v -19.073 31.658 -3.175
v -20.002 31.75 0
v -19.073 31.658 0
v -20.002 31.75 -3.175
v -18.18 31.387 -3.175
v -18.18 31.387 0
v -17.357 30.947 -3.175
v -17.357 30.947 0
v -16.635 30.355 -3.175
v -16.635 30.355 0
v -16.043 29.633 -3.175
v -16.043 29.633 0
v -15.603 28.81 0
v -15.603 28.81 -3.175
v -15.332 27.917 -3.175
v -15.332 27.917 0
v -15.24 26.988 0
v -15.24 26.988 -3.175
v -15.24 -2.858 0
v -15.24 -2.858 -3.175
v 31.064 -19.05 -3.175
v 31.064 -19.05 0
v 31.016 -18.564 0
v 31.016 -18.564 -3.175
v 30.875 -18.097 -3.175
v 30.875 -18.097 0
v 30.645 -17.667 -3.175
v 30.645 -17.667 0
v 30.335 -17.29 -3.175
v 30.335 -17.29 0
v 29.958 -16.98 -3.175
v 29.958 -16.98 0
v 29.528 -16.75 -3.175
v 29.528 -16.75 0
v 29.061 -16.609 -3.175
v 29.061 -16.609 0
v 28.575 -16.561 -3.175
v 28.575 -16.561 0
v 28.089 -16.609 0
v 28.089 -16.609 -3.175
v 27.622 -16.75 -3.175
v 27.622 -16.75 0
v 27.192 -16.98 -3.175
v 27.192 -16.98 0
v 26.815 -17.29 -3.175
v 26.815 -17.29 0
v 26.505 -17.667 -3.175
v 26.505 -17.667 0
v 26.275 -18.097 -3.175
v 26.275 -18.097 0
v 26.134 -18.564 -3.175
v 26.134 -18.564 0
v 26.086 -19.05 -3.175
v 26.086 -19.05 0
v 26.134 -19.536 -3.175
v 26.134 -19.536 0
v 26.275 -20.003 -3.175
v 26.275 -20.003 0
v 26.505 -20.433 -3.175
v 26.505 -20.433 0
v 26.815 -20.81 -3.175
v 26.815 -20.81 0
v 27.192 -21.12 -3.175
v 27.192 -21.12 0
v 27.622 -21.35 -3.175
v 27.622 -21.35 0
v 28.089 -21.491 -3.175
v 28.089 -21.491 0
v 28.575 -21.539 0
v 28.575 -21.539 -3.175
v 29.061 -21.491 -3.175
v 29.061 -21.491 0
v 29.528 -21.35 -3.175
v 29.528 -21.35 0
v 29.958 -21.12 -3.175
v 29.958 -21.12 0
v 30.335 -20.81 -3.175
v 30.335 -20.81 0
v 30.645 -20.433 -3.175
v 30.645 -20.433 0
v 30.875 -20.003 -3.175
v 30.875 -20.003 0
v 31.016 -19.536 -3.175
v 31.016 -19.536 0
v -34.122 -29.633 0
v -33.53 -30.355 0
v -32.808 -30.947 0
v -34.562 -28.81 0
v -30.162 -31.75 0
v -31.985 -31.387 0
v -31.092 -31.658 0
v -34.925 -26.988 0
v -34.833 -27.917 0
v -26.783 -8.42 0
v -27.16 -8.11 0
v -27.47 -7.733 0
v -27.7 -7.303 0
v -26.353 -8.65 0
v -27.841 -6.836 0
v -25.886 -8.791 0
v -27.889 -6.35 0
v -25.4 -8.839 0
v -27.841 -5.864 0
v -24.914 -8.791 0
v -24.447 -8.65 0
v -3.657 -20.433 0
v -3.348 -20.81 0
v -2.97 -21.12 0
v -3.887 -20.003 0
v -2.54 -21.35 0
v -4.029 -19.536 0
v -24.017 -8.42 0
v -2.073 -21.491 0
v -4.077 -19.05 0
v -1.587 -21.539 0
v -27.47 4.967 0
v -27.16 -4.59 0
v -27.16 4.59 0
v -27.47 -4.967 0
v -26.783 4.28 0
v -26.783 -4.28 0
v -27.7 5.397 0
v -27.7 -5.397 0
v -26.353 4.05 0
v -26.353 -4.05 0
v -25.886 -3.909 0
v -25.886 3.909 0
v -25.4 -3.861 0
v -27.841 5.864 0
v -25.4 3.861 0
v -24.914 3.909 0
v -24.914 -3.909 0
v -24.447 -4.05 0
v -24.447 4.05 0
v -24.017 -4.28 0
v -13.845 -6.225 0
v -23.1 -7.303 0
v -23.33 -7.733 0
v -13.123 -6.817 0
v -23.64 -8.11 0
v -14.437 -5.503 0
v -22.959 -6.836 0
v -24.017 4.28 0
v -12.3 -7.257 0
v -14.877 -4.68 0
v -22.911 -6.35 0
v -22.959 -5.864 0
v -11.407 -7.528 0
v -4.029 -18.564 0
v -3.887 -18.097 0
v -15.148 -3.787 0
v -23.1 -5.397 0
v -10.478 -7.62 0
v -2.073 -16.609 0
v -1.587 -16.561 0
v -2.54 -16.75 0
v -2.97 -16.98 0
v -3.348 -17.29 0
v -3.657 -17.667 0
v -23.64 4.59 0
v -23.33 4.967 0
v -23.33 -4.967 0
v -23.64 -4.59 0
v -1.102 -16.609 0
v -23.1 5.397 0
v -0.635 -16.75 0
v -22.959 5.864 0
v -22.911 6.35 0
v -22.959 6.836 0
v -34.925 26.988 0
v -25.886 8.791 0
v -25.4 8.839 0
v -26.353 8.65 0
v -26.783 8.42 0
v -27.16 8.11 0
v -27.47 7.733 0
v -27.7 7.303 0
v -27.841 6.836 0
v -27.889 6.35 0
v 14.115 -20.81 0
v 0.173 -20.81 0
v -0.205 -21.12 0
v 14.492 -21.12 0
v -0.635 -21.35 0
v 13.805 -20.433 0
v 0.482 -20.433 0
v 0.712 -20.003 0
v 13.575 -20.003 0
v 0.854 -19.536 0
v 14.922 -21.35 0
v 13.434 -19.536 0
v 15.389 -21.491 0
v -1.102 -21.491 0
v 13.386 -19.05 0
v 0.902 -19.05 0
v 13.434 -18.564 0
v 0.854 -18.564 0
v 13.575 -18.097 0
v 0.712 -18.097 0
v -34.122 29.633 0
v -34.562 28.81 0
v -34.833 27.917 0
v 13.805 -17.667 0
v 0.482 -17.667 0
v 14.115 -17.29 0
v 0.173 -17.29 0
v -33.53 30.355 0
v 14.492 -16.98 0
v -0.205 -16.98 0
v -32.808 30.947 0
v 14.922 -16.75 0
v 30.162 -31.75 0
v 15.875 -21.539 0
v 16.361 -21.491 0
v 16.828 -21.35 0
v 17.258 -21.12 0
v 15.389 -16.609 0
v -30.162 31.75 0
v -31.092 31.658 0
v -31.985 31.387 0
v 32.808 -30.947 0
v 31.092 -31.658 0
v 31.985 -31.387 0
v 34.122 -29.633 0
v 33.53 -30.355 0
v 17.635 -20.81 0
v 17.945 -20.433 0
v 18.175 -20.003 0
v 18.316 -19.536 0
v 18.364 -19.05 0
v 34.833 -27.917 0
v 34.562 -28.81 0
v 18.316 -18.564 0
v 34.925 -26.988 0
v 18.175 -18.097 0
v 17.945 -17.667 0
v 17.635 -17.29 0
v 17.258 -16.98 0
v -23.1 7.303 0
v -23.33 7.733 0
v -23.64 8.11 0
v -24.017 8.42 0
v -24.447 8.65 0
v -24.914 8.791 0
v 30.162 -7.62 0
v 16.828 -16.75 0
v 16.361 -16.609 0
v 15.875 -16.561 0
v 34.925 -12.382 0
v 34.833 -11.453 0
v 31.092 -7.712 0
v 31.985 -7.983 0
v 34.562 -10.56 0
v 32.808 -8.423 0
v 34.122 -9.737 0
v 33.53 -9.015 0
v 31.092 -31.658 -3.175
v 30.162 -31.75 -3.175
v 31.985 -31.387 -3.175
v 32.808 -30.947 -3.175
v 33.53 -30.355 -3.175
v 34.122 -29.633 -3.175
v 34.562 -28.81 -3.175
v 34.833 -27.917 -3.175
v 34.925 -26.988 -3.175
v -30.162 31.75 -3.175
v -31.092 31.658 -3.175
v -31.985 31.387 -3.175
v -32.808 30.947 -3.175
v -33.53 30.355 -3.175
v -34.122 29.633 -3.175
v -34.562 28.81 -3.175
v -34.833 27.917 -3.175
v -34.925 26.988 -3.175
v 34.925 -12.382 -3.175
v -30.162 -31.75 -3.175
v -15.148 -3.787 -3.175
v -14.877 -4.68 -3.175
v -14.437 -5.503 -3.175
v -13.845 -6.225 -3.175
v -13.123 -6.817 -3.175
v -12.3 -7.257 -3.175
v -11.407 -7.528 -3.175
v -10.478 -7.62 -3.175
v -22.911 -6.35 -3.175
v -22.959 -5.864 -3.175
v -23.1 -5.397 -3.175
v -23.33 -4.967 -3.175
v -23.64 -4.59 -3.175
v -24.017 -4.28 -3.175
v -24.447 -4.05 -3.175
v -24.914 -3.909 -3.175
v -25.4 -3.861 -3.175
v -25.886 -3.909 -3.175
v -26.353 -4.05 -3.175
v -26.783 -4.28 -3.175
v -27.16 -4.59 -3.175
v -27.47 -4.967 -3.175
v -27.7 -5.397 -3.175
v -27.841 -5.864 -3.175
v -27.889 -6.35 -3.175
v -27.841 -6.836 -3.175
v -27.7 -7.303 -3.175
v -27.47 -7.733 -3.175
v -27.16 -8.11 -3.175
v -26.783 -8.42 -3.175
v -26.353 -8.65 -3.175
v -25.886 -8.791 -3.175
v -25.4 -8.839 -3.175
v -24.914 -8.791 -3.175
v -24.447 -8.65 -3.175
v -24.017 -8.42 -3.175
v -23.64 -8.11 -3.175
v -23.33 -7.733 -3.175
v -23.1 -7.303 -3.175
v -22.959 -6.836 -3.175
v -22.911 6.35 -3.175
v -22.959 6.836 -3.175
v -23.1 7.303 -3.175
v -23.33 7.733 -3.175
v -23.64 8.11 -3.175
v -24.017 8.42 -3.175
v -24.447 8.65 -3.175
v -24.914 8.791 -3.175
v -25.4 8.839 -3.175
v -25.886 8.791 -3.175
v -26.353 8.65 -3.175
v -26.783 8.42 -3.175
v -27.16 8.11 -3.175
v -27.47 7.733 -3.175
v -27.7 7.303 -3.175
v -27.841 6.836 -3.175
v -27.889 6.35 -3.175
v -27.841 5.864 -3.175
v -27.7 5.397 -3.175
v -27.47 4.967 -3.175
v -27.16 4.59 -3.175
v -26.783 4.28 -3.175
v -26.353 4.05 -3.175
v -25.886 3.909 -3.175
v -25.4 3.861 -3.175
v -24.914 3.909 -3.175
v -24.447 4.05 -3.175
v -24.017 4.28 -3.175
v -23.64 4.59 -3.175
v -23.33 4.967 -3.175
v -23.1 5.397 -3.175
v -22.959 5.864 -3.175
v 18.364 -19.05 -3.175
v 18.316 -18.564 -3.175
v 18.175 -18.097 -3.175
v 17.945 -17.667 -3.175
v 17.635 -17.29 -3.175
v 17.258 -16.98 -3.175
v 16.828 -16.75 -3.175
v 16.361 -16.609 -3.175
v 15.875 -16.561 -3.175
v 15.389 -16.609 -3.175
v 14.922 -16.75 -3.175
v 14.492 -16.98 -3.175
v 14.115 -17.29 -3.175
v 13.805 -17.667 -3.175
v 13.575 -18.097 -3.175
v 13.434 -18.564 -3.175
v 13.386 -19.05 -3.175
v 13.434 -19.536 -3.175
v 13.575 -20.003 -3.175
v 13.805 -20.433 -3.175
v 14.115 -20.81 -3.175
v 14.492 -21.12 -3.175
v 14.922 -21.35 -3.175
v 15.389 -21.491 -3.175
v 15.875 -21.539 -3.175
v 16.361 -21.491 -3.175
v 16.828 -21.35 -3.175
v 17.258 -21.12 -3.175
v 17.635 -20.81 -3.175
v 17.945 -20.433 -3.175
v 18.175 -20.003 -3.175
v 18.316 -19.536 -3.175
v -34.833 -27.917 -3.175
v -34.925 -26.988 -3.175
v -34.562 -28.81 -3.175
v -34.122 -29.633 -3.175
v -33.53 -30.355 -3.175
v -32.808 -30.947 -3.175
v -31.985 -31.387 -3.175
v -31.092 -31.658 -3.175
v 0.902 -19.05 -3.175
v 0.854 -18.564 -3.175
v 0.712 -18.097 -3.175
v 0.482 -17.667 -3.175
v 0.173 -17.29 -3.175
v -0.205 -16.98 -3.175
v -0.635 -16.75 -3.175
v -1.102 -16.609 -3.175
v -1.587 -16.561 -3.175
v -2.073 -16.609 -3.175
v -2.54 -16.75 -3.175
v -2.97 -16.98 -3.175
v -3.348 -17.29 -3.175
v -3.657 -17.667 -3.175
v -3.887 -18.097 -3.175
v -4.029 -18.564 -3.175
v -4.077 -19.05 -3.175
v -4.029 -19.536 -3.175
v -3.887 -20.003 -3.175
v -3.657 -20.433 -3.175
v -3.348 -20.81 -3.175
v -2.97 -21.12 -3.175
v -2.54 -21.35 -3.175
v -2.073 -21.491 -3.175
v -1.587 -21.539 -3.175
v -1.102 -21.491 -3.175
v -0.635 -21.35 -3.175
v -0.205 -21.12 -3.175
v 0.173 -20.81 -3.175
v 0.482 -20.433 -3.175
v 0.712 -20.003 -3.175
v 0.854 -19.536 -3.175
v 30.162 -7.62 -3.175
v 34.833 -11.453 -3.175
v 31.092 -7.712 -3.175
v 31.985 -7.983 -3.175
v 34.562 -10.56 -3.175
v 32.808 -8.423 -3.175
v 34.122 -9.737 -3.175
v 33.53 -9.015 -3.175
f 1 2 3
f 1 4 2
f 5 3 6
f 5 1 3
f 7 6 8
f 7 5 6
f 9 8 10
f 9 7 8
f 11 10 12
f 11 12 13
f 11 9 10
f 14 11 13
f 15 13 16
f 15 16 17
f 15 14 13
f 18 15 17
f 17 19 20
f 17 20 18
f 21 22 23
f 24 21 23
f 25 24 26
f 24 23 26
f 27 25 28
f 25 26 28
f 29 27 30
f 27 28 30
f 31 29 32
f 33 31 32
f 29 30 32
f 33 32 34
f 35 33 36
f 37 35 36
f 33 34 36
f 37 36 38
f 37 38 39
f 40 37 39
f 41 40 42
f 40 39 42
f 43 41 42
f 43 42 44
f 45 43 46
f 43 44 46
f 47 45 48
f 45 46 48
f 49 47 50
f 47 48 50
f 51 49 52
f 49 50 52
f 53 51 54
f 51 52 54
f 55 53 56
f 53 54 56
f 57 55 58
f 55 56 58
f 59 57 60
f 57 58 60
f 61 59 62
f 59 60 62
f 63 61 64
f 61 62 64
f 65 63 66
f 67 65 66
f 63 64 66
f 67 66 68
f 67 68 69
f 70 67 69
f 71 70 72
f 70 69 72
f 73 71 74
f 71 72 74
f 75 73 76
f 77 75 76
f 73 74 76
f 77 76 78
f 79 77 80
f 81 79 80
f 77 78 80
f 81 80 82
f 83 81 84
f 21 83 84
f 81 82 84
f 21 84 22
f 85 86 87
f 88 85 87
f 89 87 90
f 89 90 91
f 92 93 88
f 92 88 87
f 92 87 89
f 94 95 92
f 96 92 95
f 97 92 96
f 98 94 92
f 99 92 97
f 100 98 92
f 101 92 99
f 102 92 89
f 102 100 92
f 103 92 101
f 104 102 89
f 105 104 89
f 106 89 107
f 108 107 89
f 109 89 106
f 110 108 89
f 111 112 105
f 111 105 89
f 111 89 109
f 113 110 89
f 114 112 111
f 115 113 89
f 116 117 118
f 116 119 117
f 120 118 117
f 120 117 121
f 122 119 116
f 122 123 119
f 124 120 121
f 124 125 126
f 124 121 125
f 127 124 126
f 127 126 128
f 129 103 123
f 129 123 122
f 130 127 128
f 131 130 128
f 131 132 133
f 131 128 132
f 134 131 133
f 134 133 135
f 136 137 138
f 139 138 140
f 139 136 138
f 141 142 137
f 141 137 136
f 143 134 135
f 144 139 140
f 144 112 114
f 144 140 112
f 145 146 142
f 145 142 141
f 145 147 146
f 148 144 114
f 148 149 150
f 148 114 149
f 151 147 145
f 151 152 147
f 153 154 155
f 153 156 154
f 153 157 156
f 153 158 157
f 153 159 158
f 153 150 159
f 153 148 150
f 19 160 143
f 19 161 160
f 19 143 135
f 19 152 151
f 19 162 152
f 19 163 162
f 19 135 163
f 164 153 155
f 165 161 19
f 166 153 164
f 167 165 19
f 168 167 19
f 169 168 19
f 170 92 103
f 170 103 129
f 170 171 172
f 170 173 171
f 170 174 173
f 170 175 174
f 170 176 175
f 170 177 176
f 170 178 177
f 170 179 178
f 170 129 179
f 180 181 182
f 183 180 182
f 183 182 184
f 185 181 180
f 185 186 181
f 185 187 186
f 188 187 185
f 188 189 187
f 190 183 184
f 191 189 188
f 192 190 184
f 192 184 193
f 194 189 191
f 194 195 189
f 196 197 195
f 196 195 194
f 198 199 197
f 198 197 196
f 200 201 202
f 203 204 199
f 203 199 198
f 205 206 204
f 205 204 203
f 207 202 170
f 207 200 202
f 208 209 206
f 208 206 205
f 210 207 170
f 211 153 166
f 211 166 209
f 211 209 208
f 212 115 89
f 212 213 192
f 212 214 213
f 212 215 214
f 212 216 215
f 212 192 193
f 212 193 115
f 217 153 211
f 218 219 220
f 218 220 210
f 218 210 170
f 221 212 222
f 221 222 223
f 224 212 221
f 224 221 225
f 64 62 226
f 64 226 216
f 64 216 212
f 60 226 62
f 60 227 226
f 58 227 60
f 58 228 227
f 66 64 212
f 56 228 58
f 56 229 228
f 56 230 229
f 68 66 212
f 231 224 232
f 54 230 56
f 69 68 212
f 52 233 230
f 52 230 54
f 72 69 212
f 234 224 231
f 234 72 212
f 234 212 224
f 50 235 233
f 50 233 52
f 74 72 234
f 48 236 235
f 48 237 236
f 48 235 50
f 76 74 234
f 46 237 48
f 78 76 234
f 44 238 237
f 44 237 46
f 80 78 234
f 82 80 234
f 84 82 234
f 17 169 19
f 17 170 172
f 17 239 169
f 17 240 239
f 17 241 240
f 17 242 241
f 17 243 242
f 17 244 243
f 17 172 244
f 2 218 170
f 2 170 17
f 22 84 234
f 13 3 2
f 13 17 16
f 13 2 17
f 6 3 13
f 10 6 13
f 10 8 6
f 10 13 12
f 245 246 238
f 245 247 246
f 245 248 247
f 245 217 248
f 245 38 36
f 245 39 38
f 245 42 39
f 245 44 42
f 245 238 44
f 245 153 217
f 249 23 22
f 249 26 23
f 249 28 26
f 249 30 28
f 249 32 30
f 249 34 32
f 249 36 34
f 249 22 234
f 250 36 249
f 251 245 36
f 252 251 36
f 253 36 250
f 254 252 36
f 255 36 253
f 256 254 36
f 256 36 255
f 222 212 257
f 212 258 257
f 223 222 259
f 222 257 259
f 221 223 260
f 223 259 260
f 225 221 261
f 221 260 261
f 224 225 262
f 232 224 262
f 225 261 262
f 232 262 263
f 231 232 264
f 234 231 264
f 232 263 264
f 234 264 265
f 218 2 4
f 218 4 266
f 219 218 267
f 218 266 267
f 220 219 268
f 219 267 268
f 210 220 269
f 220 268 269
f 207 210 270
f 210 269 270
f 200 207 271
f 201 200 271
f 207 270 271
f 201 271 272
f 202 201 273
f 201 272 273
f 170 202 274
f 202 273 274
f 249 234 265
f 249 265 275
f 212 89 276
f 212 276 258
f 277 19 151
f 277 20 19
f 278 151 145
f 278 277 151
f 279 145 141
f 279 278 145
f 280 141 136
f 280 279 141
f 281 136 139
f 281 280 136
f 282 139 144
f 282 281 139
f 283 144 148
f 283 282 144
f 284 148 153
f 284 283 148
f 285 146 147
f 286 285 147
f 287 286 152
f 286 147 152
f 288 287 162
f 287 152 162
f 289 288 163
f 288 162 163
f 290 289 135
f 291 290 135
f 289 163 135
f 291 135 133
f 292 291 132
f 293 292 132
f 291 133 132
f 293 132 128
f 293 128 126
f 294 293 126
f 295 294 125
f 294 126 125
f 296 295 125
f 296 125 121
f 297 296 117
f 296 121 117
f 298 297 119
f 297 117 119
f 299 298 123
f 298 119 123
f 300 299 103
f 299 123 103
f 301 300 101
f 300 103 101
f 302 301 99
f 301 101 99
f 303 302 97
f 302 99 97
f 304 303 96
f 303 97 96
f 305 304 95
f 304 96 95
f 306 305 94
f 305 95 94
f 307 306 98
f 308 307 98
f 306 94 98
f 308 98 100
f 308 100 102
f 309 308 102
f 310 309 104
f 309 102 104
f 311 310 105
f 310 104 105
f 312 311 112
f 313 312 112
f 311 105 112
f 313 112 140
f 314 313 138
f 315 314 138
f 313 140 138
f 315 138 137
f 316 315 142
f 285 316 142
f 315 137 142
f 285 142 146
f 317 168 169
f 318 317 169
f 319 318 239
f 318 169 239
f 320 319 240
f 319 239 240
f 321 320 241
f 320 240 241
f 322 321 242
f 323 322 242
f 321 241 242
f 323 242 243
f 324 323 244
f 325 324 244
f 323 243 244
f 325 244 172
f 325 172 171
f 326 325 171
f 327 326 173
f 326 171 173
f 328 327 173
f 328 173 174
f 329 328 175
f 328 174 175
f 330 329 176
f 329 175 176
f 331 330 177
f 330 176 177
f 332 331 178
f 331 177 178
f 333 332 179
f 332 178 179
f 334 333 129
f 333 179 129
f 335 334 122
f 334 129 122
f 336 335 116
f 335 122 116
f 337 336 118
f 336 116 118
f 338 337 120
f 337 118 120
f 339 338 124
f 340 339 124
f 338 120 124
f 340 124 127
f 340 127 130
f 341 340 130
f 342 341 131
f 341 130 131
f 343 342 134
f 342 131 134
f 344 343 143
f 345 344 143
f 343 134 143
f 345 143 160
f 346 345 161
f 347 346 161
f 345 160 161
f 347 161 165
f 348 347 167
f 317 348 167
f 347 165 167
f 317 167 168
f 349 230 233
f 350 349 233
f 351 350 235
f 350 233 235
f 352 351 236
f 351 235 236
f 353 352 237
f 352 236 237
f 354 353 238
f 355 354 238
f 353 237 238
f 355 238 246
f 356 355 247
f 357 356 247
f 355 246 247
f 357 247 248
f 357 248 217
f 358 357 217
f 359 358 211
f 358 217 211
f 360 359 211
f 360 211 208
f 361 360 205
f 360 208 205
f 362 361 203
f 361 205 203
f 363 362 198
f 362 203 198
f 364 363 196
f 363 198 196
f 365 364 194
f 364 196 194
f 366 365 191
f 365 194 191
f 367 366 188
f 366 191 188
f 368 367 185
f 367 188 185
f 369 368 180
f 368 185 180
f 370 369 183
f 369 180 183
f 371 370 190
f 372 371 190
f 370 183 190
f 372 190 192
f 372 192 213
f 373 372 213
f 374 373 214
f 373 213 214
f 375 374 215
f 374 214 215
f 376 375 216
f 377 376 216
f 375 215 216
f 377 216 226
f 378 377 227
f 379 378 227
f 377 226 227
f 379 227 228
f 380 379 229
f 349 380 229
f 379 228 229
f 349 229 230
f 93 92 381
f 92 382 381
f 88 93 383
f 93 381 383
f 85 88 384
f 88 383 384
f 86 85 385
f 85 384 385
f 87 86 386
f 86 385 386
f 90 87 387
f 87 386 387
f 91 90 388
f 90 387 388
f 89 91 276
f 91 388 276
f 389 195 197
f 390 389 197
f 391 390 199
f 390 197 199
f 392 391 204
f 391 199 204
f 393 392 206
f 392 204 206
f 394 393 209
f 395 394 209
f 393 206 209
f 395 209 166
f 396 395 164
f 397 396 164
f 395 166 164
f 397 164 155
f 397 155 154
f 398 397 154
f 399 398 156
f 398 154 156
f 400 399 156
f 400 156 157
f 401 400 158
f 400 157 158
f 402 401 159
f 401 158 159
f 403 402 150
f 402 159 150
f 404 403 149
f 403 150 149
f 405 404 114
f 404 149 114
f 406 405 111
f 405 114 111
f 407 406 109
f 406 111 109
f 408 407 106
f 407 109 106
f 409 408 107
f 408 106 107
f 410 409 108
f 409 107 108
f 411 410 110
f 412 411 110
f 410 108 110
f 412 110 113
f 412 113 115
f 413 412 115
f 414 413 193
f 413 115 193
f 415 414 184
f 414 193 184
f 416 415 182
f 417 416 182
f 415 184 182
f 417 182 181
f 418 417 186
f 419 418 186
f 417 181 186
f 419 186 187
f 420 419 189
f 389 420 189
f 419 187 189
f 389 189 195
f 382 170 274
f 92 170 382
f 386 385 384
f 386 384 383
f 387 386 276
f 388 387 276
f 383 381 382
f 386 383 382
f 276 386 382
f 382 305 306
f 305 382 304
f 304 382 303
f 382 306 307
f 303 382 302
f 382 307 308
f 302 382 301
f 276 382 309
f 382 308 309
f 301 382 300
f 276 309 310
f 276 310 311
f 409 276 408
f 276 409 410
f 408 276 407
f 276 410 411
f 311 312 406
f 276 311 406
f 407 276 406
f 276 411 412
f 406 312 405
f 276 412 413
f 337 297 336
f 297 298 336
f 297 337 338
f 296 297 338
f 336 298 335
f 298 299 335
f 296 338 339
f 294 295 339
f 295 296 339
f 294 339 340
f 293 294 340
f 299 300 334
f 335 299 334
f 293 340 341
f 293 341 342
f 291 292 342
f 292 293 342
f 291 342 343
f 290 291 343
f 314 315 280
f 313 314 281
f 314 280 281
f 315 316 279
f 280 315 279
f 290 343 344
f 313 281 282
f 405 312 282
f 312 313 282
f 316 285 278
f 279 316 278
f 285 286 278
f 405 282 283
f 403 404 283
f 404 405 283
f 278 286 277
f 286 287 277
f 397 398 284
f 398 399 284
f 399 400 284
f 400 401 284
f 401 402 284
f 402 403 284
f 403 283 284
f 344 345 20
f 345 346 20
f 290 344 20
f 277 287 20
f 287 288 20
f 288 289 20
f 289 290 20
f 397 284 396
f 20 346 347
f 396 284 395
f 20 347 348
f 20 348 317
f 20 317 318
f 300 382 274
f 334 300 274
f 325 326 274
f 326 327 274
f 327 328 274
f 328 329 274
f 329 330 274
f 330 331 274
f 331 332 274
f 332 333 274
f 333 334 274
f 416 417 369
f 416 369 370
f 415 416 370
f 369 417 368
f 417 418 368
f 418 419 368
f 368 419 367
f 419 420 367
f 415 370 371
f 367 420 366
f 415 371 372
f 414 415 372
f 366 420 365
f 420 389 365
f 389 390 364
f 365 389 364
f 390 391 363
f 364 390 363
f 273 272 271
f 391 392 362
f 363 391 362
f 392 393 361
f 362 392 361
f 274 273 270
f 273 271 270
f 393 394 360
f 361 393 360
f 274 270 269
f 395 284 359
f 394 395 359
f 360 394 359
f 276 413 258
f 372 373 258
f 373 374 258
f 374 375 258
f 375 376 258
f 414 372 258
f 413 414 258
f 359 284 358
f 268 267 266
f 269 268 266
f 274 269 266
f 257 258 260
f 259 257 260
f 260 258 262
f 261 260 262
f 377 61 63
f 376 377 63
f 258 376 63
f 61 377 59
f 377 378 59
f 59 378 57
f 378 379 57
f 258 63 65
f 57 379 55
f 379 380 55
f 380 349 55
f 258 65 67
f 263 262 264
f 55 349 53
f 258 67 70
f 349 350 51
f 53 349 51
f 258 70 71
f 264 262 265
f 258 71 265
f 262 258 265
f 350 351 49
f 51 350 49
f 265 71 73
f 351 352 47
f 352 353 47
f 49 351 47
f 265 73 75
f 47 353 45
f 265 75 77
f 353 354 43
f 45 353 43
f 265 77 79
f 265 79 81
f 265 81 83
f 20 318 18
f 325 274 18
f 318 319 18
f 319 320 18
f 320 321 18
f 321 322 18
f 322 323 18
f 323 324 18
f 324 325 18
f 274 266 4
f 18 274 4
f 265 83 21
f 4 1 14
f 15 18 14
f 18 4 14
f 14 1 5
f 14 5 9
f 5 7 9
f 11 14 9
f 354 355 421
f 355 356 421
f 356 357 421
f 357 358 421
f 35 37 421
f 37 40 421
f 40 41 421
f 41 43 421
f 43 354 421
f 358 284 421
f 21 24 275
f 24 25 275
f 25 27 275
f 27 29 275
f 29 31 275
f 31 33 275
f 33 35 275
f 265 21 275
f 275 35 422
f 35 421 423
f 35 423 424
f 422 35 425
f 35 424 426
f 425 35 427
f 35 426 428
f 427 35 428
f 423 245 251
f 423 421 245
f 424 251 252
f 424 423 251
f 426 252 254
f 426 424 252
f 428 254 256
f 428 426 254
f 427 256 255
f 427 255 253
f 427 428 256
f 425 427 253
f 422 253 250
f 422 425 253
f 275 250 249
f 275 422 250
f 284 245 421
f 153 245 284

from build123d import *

# Parameters (mm, degrees)
SKETCH1_R          = 2.4892
BASE_FLANGE1_DEPTH = 3.175
FILLET2_R          = 4.7625


# Sheet-metal steps are written as plain solids
with BuildPart() as part:
    # Sketch1 → Base-Flange1 (new body)
    with BuildSketch(Plane.XY):
        Polygon((-15.24, 31.75), (-34.925, 31.75), (-34.925, -31.75), (34.925, -31.75), (34.925, -7.62), (-15.24, -7.62), align=None)
        with Locations((-25.4, -6.35)):
            Circle(SKETCH1_R, mode=Mode.SUBTRACT)
        with Locations((-25.4, 6.35)):
            Circle(SKETCH1_R, mode=Mode.SUBTRACT)
        with Locations((-1.5875, -19.05)):
            Circle(SKETCH1_R, mode=Mode.SUBTRACT)
        with Locations((15.875, -19.05)):
            Circle(SKETCH1_R, mode=Mode.SUBTRACT)
        with Locations((28.575, -19.05)):
            Circle(SKETCH1_R, mode=Mode.SUBTRACT)
    extrude(amount=-BASE_FLANGE1_DEPTH)

    # Fillet2
    fillet2_edges = [part.edges().sort_by_distance(p)[0] for p in [
        (-34.925, -31.75, -1.5875),
        (34.925, -31.75, -1.5875),
        (34.925, -7.62, -1.5875),
        (-15.24, -7.62, -1.5875),
        (-15.24, 31.75, -1.5875),
        (-34.925, 31.75, -1.5875),
    ]]
    fillet(fillet2_edges, radius=FILLET2_R)


solid = part.part
